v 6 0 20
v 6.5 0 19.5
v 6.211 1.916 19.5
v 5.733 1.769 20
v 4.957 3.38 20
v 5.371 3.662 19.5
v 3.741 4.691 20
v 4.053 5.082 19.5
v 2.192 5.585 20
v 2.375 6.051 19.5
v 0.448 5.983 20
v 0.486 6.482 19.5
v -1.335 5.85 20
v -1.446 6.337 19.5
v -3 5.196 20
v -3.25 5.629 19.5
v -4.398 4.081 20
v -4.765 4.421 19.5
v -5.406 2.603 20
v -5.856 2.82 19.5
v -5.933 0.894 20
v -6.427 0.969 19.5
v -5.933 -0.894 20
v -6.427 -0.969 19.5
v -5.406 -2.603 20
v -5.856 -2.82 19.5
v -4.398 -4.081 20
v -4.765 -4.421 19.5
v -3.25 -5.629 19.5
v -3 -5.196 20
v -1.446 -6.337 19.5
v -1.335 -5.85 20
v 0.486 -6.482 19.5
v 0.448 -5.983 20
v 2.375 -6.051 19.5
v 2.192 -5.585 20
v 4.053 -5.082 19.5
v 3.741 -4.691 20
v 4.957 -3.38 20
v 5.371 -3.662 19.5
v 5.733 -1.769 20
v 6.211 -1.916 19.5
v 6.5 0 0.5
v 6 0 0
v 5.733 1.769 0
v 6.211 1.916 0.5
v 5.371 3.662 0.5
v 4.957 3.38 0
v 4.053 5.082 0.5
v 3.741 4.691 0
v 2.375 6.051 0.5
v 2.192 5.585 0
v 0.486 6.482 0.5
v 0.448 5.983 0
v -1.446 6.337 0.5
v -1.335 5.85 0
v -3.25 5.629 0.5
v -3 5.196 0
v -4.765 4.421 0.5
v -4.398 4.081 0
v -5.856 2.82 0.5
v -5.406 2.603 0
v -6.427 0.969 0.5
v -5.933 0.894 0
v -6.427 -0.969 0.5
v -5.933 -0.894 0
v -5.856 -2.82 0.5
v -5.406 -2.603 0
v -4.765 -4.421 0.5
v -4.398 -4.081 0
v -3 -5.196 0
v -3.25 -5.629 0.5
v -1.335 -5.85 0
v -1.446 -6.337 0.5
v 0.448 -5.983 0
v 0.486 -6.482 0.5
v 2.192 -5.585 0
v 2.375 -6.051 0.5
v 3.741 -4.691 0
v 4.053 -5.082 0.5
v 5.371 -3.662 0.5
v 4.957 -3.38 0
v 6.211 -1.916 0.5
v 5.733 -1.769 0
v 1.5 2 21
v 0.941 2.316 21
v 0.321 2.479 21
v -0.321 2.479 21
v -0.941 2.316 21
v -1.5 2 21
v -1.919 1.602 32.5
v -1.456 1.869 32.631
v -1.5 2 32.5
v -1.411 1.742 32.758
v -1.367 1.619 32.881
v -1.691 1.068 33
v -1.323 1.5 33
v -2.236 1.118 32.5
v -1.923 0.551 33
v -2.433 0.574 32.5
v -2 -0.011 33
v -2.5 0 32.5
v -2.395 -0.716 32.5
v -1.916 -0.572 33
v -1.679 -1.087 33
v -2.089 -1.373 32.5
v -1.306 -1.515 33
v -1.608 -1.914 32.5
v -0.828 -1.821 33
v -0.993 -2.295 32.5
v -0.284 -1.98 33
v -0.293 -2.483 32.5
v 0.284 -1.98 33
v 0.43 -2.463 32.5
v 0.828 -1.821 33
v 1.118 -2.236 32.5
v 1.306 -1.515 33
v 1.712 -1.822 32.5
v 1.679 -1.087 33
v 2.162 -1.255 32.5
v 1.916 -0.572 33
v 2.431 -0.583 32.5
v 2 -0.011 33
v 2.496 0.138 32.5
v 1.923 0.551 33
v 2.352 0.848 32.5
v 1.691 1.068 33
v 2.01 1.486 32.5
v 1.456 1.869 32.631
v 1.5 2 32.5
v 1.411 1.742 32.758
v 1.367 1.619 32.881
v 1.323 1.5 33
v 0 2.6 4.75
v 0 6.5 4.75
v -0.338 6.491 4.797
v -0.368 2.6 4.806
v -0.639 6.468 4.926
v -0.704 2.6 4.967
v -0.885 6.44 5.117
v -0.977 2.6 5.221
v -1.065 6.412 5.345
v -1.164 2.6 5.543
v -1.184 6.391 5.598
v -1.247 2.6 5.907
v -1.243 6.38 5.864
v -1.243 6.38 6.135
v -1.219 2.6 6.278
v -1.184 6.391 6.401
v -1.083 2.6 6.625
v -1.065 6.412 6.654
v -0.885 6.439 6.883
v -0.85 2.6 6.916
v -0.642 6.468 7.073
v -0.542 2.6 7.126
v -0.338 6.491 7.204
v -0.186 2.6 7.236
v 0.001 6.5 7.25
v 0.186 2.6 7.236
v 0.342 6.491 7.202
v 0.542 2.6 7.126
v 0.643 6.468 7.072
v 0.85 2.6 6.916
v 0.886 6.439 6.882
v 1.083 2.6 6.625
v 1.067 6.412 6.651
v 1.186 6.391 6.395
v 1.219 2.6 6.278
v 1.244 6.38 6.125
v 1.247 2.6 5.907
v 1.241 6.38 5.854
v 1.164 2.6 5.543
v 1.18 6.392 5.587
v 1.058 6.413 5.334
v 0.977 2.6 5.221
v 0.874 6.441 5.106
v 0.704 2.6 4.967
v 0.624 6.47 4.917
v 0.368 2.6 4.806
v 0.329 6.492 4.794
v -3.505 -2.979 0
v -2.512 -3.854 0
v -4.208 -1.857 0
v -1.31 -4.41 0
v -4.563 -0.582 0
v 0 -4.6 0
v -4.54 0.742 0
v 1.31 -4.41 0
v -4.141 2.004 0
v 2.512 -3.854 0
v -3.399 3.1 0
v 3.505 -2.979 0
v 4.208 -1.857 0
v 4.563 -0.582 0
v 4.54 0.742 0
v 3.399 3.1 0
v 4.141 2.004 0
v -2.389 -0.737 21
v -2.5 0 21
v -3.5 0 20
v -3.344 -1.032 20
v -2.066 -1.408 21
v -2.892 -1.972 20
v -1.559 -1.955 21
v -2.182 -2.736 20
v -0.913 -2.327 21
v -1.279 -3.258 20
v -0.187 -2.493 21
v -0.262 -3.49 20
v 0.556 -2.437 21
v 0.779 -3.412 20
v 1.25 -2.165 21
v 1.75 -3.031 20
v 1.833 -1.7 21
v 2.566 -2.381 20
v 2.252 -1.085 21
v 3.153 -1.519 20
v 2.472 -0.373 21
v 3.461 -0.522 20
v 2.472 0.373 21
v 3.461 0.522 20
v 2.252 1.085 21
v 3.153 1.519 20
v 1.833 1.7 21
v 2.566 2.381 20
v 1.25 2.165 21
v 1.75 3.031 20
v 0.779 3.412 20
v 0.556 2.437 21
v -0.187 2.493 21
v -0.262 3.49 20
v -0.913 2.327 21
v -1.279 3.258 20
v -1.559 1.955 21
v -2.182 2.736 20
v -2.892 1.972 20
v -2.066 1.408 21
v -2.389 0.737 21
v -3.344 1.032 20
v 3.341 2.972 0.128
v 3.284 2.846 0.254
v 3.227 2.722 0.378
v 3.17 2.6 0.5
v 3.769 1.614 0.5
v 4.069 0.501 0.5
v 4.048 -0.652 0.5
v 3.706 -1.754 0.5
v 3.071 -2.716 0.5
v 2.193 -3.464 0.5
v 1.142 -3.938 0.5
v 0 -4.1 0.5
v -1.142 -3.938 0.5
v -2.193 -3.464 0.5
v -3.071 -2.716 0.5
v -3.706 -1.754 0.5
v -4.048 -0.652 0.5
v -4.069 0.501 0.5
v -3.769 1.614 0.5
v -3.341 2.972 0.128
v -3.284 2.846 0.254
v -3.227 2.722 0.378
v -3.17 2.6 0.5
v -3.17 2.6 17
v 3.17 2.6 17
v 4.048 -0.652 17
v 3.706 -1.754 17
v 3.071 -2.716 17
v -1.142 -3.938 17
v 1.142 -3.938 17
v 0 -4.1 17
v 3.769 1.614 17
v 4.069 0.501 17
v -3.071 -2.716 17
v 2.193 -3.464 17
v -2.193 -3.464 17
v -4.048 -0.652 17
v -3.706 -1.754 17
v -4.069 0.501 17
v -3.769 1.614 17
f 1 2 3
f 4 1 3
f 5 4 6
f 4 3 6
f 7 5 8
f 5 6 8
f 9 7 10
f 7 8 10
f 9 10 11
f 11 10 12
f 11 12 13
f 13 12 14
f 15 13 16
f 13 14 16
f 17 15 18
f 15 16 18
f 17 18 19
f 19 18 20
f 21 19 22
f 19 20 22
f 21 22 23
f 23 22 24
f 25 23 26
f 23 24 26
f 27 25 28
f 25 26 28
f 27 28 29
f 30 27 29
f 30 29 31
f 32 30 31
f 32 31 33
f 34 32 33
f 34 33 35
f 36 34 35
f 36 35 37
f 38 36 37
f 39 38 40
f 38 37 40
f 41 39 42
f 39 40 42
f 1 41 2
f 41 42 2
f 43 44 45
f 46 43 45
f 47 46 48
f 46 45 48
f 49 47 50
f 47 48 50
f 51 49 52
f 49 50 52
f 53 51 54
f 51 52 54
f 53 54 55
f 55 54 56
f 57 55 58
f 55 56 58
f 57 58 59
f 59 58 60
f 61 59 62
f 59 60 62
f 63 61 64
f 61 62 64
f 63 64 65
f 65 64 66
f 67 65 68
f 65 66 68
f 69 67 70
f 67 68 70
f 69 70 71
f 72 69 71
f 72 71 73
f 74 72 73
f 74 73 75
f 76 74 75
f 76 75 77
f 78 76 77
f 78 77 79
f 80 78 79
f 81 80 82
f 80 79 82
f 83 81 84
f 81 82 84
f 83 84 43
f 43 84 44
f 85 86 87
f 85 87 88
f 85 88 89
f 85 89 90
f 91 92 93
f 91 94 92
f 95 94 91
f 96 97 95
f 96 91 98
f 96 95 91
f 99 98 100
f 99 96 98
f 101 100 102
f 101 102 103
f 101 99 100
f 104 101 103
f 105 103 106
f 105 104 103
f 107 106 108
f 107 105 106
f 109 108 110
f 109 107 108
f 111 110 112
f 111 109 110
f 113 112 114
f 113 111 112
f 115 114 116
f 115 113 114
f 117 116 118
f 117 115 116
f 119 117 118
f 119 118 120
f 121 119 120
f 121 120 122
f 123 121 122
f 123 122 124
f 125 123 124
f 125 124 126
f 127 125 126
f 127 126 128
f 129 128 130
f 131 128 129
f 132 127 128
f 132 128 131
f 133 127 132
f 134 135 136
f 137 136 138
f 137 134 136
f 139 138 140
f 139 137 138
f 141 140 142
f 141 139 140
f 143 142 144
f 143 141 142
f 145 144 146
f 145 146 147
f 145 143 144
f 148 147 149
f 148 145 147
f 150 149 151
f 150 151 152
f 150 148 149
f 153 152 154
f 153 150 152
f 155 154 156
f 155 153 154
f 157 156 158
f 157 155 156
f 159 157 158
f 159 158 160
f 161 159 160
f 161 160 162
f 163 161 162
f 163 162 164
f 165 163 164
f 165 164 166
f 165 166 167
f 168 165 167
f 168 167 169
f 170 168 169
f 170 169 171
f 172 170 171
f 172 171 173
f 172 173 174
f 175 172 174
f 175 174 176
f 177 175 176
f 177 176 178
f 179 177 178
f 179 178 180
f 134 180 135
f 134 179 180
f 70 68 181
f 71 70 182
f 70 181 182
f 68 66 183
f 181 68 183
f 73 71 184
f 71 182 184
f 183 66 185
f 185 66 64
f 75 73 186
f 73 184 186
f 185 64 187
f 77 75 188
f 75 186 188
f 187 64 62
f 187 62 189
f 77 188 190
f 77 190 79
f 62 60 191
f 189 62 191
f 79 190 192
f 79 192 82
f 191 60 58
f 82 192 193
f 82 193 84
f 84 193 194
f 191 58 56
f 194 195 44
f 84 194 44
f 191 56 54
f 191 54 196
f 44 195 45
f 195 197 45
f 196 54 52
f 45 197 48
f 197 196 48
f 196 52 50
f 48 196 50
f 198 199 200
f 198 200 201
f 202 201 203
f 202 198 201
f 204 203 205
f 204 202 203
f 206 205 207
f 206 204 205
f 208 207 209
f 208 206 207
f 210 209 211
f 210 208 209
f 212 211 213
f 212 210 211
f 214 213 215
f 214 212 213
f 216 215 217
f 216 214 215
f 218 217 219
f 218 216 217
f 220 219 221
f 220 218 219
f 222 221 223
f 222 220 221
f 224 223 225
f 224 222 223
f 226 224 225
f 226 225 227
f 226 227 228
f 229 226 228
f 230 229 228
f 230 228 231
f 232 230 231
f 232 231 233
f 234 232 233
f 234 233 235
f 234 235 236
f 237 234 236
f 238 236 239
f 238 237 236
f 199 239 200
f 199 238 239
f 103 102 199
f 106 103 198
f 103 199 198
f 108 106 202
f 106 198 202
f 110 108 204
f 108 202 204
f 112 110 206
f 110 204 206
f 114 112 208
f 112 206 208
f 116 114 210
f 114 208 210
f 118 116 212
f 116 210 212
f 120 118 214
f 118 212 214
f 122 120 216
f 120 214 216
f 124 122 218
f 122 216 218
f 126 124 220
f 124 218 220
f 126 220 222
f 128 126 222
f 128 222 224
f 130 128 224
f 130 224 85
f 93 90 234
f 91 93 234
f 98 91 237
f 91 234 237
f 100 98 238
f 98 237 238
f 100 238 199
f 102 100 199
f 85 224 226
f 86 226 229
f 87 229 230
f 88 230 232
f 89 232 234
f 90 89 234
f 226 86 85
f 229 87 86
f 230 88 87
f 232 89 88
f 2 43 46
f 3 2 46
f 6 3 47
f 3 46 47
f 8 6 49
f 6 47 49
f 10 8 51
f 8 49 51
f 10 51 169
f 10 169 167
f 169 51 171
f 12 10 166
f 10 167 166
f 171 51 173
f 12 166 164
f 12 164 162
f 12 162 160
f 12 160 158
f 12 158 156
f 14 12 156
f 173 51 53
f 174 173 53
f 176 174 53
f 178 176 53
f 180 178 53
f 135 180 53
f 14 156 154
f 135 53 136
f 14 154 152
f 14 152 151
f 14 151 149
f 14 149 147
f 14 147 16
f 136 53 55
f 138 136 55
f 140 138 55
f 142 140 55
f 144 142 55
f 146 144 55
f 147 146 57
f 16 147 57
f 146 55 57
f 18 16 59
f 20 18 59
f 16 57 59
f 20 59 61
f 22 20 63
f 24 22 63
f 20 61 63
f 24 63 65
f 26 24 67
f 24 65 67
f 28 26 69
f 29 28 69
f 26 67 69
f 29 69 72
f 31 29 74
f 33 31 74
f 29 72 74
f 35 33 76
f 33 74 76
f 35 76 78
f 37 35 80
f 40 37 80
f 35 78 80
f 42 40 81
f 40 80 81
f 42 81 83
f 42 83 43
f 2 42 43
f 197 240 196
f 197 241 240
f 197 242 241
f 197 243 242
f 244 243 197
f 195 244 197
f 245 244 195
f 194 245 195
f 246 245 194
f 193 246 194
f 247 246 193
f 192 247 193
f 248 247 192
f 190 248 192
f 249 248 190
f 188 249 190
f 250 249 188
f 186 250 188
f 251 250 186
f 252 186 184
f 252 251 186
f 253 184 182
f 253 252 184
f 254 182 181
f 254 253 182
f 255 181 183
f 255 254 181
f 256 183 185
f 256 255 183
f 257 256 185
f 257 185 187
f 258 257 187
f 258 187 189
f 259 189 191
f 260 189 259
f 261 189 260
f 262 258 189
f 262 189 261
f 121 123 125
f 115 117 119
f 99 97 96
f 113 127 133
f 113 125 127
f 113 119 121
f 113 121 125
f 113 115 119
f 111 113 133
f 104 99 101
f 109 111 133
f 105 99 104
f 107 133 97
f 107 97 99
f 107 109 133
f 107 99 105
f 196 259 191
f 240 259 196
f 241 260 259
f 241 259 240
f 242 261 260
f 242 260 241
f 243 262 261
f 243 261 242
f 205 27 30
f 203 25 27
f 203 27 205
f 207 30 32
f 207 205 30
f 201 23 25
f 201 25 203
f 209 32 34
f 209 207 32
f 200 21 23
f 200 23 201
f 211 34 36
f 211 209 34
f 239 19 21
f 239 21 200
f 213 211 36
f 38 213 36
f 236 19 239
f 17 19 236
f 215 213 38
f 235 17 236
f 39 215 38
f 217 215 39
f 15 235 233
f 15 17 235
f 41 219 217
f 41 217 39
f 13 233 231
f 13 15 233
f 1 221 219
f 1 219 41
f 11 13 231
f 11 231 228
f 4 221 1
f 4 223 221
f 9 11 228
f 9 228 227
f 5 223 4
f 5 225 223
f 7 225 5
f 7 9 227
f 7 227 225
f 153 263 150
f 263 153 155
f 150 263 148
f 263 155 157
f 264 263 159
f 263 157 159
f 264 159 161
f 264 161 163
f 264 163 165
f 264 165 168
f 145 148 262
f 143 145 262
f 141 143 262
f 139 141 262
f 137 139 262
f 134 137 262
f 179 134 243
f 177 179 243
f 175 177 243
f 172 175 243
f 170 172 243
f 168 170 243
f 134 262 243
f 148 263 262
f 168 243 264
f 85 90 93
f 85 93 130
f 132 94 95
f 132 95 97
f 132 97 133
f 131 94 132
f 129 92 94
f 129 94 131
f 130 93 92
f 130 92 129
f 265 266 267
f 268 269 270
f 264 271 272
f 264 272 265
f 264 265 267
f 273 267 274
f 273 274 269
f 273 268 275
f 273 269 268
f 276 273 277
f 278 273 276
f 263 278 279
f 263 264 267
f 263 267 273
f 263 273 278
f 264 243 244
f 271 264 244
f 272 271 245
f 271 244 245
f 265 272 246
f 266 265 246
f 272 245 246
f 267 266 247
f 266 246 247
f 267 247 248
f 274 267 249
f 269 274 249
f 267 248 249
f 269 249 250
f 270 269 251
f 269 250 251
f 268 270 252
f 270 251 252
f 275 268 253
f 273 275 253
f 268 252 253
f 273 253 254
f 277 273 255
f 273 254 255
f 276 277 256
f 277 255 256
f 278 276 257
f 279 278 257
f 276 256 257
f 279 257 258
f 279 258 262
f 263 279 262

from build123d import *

# Parameters (mm, degrees)
SKETCH_1_R          = 6.5
EXTRUDE_1_DEPTH     = 20
CUT_EXTRUDE_1_DEPTH = 17
SKETCH_3_R          = 2.5
EXTRUDE_2_DEPTH     = 13
CUT_EXTRUDE_START   = -12
CUT_EXTRUDE_2_DEPTH = 12
CHAMFER_1_SIZE      = 1
CUT_EXTRUDE_3_DEPTH = 17
CHAMFER_2_SIZE      = 0.5
CHAMFER_3_SIZE      = 0.5
SKETCH_6_R          = 1.25
CUT_EXTRUDE_4_DEPTH = 10


with BuildPart() as part:
    # 草图1 → 凸台-拉伸1 (new body)
    with BuildSketch(Plane.XY):
        Circle(SKETCH_1_R)
    extrude(amount=EXTRUDE_1_DEPTH)

    # 草图2 → 切除-拉伸1 (cut)
    with BuildSketch(Plane(origin=(0, 0, 0), x_dir=(-1, 0, 0), z_dir=(0, 0, -1))):
        with BuildLine():
            Line((3.122498999, 2.5), (-3.122498999, 2.5))
            ThreePointArc((-3.122498999, 2.5), (-3.605551275, -1.732050808), (0, -4))
            ThreePointArc((0, -4), (2.828427125, -2.828427125), (4, 0))
            ThreePointArc((4, 0), (3.774254628, 1.324764885), (3.122498999, 2.5))
        make_face()
    extrude(amount=-CUT_EXTRUDE_1_DEPTH, mode=Mode.SUBTRACT)

    # 草图3 → 凸台-拉伸2 (add)
    with BuildSketch(Plane.XY.offset(20)):
        with Locations(Location((0, 0, 0), (0, 0, 180))):
            Circle(SKETCH_3_R)
    extrude(amount=EXTRUDE_2_DEPTH)

    # 草图4 → 切除-拉伸2 (cut)
    with BuildSketch(Plane.XY.offset(33).offset(CUT_EXTRUDE_START)):
        with BuildLine():
            Line((-1.5, 2), (1.5, 2))
            ThreePointArc((1.5, 2), (0, 2.5), (-1.5, 2))
        make_face()
    extrude(amount=CUT_EXTRUDE_2_DEPTH, mode=Mode.SUBTRACT)

    # 倒角1
    chamfer_1_edges = [part.edges().sort_by_distance(p)[0] for p in [
        (2.5, 0, 20),
    ]]
    chamfer(chamfer_1_edges, length=CHAMFER_1_SIZE - 0.0001)  # a hair under: the kernel refuses the full size

    # 草图5 → 切除-拉伸3 (cut)
    with BuildSketch(Plane(origin=(0, 0, 0), x_dir=(-1, 0, 0), z_dir=(0, 0, -1))):
        with BuildLine():
            Line((3.170173497, 2.6), (-3.170173497, 2.6))
            ThreePointArc((-3.170173497, 2.6), (0, -4.1), (3.170173497, 2.6))
        make_face()
    extrude(amount=-CUT_EXTRUDE_3_DEPTH, mode=Mode.SUBTRACT)

    # 倒角2
    chamfer_2_edges = [part.edges().sort_by_distance(p)[0] for p in [
        (1.118033989, -2.236067977, 33),
        (0, 2, 33),
    ]]
    chamfer(chamfer_2_edges, length=CHAMFER_2_SIZE - 0.0001)  # a hair under: the kernel refuses the full size

    # 倒角3
    chamfer_3_edges = [part.edges().sort_by_distance(p)[0] for p in [
        (-6.5, 0, 0),
        (0, -4.1, 0),
        (0, 2.6, 0),
        (-6.5, 0, 20),
    ]]
    chamfer(chamfer_3_edges, length=CHAMFER_3_SIZE)

    # 草图6 → 切除-拉伸4 (cut)
    with BuildSketch(Plane(origin=(0, 0, 0), x_dir=(1, 0, 0), z_dir=(0, 1, 0))):
        with Locations(Location((0, -6, 0), (0, 0, 90))):
            Circle(SKETCH_6_R)
    extrude(amount=CUT_EXTRUDE_4_DEPTH, mode=Mode.SUBTRACT)


solid = part.part
